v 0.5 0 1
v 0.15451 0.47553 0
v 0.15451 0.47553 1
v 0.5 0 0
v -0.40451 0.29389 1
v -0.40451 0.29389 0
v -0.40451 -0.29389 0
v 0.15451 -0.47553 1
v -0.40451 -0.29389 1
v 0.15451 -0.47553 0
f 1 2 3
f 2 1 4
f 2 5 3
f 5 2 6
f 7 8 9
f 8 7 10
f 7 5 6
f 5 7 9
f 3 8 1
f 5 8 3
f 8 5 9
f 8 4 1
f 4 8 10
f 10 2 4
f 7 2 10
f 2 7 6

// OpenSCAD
module thread(r=0.5, d=0.1, h=1, thr=1/6) {
    //$fn=180;
    loop_count=h/thr;

    function section_vertices(a=0) = [
        [(r+d)*cos(a), (r+d)*sin(a), 0],
        // [r*cos(a), r*sin(a), -thr/2],
        // [r*cos(a), r*sin(a), thr/2]
        // extending further to guarantee overlap with cylinder
        [(r-d)*cos(a), (r-d)*sin(a), -thr],
        [(r-d)*cos(a), (r-d)*sin(a), thr]
    ];

    module section(a) {
        v = section_vertices();
        // vv = section_vertices(a);
        vv = section_vertices(a*1.1);
        Faces = [
            [0,1,2],   // section
            [3,5,4],   // next section
            [0,2,5,3], // other lateral
            [0,3,4,1], // one lateral
            [1,4,5,2]  // base
        ]; // ! make sure all face are oriented in the same direction (all vertices clockwise (or all anti-))
        polyhedron(points = concat(v, vv), faces=Faces);
    }
    // section(360/$fn);

    module section_i(i) {
      ang=i*360/$fn;
      hh=thr*i/$fn;
      translate([0,0,hh])
        rotate(a=ang, v=[0,0,1])
          section(360/$fn);
    }

    module helico() {
        union() {
        for (i=[0:$fn*loop_count]) {
            section_i(i);
        }
        }
    }

    union() {
        cylinder(r=r, h=h);
        helico();
    }

}

thread();
